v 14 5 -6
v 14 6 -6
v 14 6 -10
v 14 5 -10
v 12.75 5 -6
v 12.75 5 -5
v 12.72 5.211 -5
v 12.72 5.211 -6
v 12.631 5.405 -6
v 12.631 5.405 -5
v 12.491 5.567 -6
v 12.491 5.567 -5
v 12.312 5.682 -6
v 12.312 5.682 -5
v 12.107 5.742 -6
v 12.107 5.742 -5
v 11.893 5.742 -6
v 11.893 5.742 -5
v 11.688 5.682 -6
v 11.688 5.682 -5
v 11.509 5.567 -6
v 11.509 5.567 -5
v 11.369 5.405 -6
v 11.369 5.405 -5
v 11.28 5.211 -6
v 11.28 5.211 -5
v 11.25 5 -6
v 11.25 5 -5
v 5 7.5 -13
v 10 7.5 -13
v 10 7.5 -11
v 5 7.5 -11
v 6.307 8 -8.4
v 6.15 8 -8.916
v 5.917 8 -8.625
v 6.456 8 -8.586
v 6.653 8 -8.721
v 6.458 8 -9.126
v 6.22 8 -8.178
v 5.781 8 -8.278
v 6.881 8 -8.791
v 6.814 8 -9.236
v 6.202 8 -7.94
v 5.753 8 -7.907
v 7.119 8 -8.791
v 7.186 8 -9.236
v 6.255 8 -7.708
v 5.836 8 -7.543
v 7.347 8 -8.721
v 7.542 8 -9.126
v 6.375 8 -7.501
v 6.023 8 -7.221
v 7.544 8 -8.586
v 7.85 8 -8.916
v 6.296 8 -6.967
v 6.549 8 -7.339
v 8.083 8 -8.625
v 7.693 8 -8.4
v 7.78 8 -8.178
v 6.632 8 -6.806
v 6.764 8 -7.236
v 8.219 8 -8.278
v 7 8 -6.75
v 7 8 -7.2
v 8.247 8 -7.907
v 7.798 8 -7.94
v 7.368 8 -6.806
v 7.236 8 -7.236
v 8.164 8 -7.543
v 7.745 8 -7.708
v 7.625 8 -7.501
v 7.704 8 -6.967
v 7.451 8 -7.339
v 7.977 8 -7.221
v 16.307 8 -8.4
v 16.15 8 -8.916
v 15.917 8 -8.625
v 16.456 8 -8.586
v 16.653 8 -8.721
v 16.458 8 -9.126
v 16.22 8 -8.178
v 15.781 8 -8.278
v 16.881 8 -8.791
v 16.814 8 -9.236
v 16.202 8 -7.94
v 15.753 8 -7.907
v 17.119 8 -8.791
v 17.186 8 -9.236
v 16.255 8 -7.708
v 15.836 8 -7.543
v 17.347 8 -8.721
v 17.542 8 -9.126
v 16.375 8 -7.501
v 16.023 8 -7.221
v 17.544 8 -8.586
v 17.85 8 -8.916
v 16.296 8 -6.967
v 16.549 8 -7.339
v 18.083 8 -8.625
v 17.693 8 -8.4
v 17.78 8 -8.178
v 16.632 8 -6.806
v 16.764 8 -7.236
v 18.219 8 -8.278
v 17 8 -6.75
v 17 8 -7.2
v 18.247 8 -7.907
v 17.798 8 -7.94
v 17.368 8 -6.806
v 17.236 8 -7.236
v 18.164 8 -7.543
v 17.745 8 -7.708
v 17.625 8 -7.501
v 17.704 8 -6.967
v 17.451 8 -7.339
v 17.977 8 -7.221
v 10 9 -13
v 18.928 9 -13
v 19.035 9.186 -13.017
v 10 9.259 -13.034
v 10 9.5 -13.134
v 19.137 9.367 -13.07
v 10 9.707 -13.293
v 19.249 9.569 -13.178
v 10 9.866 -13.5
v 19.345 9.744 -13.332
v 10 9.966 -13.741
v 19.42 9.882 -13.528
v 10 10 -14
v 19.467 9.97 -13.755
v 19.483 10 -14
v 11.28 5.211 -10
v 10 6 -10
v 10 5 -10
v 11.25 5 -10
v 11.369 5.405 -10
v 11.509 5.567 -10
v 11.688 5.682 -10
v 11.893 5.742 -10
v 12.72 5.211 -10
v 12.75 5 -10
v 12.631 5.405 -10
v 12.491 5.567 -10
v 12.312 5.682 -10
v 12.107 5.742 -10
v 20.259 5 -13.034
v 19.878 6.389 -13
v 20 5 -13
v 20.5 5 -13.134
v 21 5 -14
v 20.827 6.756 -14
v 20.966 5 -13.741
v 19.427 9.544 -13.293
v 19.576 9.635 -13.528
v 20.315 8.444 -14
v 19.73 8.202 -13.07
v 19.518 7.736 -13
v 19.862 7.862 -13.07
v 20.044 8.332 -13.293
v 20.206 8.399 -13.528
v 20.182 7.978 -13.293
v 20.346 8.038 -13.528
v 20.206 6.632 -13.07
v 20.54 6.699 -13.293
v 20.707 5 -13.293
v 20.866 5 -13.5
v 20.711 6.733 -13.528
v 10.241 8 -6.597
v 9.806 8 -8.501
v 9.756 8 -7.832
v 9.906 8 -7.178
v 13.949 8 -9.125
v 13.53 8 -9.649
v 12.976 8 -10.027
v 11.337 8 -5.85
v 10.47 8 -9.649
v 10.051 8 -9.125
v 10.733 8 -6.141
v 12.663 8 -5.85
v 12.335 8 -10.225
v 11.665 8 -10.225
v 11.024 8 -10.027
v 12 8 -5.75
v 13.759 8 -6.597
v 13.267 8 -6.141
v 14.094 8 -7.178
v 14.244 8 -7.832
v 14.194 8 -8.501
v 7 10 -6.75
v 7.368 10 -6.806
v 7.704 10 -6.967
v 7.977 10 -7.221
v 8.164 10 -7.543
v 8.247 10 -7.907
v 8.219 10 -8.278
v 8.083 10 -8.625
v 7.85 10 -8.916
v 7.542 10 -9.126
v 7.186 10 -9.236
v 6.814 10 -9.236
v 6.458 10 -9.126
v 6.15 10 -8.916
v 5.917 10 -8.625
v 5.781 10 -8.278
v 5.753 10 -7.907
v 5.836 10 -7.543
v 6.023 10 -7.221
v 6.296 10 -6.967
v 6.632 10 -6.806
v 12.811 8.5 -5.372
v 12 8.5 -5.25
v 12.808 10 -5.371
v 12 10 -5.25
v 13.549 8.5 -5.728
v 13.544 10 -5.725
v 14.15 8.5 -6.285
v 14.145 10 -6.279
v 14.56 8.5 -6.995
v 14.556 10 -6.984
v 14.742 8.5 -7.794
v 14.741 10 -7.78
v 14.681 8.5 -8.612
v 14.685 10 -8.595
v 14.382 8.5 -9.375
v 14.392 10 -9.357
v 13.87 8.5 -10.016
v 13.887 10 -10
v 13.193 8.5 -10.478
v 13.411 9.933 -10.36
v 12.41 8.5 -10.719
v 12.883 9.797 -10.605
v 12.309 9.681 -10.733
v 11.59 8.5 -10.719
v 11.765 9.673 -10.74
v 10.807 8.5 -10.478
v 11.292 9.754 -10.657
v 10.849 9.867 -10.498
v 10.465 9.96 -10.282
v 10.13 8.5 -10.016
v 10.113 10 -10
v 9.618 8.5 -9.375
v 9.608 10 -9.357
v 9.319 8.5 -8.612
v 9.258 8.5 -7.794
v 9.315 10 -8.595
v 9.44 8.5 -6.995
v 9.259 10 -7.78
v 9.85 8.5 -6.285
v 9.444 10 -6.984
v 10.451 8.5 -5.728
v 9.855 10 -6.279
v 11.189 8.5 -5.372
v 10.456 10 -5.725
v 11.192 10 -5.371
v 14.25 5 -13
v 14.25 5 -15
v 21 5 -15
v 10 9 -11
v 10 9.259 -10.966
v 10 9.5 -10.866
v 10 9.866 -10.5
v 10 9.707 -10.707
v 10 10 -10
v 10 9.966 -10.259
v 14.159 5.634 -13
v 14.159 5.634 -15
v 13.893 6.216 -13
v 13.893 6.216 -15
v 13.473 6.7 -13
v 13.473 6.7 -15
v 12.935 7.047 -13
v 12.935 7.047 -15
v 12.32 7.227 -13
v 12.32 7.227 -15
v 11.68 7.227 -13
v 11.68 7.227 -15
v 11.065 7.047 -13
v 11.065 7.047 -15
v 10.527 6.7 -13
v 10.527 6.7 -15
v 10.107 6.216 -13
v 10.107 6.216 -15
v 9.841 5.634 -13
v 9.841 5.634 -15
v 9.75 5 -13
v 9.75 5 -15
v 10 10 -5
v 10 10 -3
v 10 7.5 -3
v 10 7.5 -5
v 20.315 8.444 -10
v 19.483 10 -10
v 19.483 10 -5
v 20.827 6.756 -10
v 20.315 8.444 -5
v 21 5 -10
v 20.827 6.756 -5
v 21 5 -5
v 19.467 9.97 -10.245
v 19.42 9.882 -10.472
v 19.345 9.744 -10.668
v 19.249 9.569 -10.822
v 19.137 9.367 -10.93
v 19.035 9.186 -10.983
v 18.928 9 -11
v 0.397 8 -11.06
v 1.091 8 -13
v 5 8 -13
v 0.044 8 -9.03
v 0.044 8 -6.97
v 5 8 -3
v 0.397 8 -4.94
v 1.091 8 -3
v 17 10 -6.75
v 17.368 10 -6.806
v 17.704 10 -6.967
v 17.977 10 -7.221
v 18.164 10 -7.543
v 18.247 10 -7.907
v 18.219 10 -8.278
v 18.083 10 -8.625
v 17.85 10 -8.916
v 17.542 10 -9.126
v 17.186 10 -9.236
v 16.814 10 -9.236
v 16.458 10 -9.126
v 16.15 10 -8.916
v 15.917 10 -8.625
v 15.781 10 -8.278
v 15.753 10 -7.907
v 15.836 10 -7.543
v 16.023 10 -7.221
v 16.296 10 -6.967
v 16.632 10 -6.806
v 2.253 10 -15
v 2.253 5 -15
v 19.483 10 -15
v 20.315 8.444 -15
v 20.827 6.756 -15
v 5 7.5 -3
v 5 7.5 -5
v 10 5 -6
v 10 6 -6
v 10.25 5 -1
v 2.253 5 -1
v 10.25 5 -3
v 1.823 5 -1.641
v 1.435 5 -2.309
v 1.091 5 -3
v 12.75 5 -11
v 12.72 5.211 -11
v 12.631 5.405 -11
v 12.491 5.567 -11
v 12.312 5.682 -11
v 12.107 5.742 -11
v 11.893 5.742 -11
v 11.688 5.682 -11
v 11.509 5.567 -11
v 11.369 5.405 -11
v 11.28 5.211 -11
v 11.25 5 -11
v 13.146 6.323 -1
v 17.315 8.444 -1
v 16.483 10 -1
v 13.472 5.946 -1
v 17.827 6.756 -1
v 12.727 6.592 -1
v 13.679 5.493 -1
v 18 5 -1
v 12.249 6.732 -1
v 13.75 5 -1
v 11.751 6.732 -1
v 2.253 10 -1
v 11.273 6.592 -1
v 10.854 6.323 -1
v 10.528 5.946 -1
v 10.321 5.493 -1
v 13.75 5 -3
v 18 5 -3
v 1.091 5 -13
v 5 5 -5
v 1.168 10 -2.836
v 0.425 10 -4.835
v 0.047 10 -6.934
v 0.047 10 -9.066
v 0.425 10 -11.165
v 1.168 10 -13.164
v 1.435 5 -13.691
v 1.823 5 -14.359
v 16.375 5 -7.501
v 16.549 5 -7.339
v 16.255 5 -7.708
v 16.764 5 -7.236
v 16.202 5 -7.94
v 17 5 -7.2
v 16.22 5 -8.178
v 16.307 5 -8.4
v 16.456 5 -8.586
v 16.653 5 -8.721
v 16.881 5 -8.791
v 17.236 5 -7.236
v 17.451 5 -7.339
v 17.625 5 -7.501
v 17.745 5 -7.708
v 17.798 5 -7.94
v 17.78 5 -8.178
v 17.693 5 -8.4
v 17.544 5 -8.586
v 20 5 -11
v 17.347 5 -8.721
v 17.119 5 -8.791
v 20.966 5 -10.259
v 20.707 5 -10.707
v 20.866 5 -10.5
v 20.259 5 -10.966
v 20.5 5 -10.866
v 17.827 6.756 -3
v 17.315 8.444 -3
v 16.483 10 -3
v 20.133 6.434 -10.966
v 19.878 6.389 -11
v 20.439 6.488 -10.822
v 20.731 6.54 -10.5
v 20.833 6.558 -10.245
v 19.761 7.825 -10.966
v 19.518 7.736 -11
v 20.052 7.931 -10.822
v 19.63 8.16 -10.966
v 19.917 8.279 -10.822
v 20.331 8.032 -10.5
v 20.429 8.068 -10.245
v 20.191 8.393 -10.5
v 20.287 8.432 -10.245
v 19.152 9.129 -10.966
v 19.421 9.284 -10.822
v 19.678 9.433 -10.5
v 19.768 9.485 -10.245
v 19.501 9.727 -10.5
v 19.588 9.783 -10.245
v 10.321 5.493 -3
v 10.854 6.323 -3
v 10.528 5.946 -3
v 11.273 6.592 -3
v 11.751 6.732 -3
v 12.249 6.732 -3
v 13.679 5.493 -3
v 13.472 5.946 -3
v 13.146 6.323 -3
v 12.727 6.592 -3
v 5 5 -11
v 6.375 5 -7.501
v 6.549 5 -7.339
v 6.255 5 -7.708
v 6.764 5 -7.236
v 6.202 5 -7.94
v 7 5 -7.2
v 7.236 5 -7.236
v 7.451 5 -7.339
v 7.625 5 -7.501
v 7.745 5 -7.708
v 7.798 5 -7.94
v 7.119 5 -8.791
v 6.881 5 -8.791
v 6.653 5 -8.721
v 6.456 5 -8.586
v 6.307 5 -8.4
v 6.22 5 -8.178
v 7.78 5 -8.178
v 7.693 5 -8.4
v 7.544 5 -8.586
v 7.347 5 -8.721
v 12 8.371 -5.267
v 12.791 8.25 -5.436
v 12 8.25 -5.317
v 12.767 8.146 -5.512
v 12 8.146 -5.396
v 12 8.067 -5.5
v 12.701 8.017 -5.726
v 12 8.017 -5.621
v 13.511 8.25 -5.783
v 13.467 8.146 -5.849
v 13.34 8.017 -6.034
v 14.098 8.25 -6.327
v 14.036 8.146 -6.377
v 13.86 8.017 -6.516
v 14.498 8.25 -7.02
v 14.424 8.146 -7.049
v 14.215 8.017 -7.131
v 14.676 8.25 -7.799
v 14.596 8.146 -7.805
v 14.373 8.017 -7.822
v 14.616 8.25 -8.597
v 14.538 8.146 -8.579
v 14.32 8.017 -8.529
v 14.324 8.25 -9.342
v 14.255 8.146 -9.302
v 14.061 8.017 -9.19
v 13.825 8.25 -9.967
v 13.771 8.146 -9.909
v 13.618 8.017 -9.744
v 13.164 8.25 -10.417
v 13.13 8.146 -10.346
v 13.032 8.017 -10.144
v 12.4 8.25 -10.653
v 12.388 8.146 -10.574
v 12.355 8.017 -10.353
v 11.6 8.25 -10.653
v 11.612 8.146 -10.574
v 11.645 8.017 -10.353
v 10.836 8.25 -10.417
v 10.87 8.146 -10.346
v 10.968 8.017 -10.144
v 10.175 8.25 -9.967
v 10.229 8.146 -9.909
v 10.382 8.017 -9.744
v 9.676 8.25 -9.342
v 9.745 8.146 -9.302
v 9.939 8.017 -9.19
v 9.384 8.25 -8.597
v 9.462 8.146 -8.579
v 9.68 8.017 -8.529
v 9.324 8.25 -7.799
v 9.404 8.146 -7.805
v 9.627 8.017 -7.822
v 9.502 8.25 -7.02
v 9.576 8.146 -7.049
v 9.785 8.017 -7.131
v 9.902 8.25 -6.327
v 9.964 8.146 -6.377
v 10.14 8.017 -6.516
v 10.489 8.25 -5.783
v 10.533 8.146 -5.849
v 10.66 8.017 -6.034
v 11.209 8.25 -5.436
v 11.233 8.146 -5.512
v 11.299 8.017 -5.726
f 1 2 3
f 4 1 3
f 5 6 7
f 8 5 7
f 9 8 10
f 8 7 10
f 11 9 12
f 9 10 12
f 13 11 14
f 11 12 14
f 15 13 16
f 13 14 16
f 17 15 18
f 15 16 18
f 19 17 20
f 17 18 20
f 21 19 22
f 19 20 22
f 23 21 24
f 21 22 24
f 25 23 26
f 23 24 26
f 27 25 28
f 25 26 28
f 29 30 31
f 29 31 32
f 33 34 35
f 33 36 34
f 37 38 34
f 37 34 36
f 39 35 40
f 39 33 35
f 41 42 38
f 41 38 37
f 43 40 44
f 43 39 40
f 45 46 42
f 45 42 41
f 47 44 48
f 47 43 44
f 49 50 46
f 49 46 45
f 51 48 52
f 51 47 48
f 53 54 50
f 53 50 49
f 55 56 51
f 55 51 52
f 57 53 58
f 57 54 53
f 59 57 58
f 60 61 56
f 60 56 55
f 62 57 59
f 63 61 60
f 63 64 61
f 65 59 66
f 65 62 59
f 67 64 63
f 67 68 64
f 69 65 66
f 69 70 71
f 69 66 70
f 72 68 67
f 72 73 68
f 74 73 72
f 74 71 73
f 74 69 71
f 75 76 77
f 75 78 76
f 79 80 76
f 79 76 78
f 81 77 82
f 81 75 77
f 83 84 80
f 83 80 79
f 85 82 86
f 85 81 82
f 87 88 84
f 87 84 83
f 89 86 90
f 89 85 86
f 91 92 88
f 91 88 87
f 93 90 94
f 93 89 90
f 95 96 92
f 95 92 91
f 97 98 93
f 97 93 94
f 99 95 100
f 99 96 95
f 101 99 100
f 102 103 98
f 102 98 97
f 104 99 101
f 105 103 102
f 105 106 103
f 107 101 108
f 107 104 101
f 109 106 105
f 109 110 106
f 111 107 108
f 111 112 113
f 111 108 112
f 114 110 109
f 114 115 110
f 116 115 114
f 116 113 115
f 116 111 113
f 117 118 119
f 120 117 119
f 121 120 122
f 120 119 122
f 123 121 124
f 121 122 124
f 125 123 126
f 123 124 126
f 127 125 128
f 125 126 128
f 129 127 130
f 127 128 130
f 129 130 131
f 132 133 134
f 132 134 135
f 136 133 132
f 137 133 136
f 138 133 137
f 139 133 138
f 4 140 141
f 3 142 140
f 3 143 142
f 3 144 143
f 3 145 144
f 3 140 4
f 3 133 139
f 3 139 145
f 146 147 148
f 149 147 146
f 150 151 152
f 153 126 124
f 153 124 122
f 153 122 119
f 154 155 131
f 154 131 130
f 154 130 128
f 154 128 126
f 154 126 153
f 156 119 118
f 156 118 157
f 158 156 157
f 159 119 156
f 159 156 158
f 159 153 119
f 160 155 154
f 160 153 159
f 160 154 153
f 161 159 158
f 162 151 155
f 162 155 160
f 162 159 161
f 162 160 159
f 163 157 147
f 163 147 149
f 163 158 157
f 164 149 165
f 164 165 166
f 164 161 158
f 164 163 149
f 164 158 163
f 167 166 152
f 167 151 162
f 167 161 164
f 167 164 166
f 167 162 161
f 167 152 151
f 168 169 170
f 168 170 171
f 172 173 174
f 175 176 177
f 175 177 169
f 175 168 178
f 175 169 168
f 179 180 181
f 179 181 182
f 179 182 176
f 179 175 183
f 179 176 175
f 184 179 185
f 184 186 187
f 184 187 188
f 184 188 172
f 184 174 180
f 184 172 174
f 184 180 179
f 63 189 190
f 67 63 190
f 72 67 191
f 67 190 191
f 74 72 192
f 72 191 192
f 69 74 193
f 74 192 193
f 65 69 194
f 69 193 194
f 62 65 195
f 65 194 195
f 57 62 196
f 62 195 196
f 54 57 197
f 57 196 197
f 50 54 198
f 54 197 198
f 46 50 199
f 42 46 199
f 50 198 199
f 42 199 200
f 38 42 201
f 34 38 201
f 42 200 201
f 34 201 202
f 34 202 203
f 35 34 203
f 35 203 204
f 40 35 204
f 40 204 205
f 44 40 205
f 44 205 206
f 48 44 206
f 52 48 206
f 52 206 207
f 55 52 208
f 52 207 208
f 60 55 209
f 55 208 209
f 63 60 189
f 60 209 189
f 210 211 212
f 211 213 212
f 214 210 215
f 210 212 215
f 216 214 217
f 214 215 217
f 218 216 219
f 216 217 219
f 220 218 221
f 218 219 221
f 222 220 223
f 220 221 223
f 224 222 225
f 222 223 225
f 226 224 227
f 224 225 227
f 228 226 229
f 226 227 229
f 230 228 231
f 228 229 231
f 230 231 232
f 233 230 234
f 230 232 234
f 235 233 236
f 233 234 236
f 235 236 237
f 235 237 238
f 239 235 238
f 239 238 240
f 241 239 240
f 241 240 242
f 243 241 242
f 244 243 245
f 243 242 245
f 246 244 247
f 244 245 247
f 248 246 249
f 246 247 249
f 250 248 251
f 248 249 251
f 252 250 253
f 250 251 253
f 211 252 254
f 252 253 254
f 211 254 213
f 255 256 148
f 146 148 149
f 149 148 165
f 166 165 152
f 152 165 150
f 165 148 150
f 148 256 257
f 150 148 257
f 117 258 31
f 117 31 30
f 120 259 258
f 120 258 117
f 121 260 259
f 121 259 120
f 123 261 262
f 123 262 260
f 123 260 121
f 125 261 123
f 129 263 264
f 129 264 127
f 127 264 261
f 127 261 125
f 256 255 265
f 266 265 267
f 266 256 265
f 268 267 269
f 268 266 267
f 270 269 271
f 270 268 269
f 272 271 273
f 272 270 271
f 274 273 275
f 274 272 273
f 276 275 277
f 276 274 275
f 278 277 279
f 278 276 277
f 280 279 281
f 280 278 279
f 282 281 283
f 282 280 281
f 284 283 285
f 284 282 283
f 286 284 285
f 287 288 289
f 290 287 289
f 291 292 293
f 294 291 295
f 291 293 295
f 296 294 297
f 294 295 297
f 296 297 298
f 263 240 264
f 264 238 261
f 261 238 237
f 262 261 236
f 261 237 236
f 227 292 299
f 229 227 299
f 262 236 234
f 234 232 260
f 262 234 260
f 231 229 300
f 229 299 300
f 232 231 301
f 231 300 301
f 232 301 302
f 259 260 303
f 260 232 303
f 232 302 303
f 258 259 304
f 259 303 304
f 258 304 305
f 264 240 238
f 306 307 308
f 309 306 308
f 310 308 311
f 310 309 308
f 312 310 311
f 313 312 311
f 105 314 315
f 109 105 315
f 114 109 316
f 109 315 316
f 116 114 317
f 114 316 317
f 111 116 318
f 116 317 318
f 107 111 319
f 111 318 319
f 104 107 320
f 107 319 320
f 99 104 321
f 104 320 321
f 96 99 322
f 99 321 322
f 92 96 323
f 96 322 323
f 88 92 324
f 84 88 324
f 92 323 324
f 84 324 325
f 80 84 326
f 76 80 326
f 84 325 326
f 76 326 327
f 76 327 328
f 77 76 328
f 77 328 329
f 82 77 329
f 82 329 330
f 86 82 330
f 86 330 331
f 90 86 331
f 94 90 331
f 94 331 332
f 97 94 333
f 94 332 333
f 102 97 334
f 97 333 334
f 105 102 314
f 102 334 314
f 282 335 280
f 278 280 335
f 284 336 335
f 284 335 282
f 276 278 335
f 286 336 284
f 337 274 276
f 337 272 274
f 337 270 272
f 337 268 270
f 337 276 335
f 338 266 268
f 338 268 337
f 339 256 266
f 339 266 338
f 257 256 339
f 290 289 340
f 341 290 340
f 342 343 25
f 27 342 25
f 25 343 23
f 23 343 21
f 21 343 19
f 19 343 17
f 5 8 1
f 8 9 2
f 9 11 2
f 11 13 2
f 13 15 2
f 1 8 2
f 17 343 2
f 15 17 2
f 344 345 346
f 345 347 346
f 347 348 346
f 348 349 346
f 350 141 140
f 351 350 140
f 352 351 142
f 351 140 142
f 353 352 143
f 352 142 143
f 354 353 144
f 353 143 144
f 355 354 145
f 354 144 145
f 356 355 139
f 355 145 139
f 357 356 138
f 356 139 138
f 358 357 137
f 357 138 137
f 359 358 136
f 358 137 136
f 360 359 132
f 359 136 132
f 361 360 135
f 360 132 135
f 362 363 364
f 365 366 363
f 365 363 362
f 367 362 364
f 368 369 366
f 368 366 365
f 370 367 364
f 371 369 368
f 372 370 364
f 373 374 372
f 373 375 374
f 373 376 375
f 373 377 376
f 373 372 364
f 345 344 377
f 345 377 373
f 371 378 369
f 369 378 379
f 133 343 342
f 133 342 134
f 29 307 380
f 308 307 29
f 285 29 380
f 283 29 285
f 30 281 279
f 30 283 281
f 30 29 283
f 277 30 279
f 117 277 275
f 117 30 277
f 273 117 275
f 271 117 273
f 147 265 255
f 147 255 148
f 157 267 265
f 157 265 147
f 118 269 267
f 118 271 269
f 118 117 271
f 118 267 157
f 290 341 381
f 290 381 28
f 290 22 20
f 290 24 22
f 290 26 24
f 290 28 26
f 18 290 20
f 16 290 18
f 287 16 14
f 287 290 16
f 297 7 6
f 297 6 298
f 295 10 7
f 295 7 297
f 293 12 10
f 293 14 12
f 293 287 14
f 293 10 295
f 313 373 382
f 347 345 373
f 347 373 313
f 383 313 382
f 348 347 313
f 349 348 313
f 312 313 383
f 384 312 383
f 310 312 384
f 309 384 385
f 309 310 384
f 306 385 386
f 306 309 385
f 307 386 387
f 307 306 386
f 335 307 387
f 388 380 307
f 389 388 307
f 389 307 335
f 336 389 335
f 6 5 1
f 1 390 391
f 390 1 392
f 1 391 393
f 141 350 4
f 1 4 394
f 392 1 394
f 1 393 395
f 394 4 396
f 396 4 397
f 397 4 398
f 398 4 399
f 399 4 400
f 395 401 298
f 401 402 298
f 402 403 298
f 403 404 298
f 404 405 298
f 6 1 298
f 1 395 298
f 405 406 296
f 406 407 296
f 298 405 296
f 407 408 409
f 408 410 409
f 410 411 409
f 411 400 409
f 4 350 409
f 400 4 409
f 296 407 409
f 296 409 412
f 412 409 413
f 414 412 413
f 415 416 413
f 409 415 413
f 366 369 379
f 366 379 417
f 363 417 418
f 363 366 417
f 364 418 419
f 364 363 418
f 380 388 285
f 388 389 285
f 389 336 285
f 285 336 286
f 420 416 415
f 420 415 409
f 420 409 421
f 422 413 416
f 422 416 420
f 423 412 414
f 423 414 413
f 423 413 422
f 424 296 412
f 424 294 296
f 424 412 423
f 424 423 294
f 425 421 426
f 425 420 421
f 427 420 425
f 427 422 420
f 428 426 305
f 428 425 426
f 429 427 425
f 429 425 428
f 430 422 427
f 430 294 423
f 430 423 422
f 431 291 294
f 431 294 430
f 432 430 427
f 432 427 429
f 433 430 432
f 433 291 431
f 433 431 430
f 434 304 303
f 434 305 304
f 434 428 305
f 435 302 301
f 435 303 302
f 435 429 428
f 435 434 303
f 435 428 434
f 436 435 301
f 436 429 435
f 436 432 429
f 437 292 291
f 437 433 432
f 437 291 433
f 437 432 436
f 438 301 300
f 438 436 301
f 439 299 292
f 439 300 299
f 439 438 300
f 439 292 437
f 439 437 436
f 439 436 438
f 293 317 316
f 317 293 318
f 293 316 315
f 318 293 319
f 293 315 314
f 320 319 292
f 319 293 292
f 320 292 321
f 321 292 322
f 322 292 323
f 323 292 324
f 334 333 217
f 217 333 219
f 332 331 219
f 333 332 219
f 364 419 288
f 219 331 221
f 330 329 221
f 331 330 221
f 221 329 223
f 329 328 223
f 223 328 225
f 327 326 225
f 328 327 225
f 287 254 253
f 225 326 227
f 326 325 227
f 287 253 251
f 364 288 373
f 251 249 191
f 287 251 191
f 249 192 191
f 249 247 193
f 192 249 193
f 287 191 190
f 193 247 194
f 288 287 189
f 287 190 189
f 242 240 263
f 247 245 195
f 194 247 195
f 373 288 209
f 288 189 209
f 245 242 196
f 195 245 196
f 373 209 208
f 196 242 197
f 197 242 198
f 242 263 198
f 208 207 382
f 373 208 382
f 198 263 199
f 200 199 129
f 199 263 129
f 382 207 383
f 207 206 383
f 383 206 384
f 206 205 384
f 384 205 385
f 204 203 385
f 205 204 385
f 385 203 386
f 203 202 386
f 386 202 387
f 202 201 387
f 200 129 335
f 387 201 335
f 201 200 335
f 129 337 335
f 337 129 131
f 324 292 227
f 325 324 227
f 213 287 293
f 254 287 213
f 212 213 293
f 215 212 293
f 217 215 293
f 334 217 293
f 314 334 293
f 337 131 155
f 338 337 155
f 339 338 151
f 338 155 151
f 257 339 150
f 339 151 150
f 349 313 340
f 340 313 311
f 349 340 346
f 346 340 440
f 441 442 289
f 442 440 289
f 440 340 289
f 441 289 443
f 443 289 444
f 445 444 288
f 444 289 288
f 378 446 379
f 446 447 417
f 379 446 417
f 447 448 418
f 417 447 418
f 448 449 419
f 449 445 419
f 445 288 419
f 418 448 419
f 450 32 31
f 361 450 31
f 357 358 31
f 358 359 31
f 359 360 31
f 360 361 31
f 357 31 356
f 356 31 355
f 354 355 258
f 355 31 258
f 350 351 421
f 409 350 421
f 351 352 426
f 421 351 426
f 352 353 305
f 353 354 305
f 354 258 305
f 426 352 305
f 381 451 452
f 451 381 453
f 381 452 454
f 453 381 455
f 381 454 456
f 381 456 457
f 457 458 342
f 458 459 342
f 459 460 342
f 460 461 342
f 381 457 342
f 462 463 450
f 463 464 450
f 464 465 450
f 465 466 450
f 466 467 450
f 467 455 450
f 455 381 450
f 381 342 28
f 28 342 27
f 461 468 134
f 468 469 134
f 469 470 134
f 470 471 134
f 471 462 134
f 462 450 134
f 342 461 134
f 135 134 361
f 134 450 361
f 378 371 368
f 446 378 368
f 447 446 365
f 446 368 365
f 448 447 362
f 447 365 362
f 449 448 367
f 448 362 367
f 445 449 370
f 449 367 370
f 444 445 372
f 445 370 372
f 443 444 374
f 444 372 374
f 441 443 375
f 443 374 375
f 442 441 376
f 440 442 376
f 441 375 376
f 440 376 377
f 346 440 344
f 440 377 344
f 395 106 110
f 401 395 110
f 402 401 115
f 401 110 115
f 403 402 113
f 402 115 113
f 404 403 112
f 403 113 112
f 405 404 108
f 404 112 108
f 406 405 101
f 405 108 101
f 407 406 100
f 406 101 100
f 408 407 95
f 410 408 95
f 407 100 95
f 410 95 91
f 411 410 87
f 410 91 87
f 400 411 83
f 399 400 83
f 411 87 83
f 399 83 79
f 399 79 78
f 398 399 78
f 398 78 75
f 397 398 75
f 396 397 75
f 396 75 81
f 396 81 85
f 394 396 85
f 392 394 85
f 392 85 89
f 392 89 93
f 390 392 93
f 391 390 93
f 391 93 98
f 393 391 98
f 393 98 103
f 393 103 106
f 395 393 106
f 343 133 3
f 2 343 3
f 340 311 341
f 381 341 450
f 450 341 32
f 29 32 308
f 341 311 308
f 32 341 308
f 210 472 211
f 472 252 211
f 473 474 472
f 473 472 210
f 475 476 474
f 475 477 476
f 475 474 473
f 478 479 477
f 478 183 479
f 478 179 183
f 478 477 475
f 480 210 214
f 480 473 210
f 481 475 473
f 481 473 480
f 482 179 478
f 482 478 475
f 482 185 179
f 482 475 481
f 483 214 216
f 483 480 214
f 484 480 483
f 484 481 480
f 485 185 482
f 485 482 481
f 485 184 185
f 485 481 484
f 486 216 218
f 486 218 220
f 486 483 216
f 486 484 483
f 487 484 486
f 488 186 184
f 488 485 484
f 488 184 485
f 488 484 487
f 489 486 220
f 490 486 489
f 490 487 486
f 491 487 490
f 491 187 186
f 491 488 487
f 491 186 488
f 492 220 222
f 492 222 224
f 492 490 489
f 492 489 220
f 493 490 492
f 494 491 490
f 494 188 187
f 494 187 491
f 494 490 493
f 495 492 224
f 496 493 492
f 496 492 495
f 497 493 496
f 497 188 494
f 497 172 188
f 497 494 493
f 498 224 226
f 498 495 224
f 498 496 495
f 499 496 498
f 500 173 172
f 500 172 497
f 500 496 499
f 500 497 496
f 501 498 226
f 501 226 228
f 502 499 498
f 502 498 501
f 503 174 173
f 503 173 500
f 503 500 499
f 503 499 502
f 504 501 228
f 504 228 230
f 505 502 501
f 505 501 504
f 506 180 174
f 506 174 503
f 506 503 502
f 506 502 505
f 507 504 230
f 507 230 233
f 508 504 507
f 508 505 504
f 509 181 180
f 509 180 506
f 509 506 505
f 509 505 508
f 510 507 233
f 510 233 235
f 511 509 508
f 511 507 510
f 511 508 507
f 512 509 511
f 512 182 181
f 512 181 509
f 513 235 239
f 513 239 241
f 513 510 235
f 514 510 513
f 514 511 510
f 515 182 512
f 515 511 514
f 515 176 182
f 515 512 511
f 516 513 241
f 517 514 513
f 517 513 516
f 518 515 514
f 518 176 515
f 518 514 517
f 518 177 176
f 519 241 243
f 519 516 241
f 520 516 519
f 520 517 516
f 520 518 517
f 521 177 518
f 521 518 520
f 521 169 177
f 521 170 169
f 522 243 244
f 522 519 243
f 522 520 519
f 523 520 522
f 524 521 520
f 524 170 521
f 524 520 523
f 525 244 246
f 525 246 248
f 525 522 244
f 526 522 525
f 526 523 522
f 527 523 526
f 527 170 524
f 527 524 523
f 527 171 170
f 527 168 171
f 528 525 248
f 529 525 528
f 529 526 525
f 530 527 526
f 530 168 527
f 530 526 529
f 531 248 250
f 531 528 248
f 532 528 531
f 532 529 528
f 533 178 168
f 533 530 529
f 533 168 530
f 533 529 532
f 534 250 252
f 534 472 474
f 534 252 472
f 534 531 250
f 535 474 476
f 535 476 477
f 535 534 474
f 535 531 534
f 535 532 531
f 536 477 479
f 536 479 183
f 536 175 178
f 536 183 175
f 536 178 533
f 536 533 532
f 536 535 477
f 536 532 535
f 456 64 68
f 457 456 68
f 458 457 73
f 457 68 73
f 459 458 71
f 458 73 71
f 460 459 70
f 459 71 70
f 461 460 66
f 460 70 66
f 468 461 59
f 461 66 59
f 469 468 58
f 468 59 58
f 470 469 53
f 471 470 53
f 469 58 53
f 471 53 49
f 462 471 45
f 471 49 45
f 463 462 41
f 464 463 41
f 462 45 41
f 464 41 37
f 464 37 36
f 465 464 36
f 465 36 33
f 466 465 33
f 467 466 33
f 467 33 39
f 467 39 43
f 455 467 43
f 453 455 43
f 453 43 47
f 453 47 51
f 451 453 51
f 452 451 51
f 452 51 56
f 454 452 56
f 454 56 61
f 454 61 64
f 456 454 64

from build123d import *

# Parameters (mm, degrees)
BOSS_EXTRUDE1_DEPTH = 10
CUT_EXTRUDE3_DEPTH  = 28.676705006
CUT_EXTRUDE6_START  = -13
CUT_EXTRUDE6_DEPTH  = 2
CUT_EXTRUDE14_START = -3
CUT_EXTRUDE14_DEPTH = 2
CUT_EXTRUDE7_START  = 10
SKETCH8_R           = 2.75
CUT_EXTRUDE7_DEPTH  = 2
CUT_EXTRUDE8_START  = -16
SKETCH10_R          = 2.25
CUT_EXTRUDE8_DEPTH  = 3
CUT_EXTRUDE9_DEPTH  = 5
SKETCH18_R          = 0.75
CUT_EXTRUDE12_DEPTH = 28.676705006
CUT_EXTRUDE13_START = 5
SKETCH19_W          = 4
SKETCH19_H          = 4
CUT_EXTRUDE13_DEPTH = 1
CUT_EXTRUDE15_START = -1
SKETCH5_R           = 1.75
CUT_EXTRUDE15_DEPTH = 2
CUT_EXTRUDE16_START = -1
CUT_EXTRUDE16_DEPTH = 2
FILLET2_R           = 0.5
FILLET3_R           = 1
POT_INSERT_DEPTH    = 2.5
POT_START           = 4
SKETCH6_R           = 2.75
POT_HOLE_DEPTH      = 1.5
SCREW_START         = 11
SKETCH14_R          = 0.8
SCREW_HOLES_DEPTH   = 9
SCREW_START_2       = 10
SKETCH15_R          = 1.25
SCREW_HEADS_DEPTH   = 2
SKETCH13_W          = 21
SKETCH13_H          = 15
CUT_EXTRUDE11_DEPTH = 5


with BuildPart() as part:
    # Sketch1 → Boss-Extrude1 (new body)
    with BuildSketch(Plane(origin=(0, 0, 0), x_dir=(1, 0, 0), z_dir=(0, 1, 0))):
        with BuildLine():
            Line((21, 15), (21, 8))
            Line((21, 8), (21, 1))
            Line((21, 1), (12, 1))
            Line((12, 1), (2.253205655, 1))
            ThreePointArc((2.253205655, 1), (0, 8), (2.253205655, 15))
            Line((2.253205655, 15), (12, 15))
            Line((12, 15), (21, 15))
        make_face()
    extrude(amount=BOSS_EXTRUDE1_DEPTH)

    # Sketch4 → Cut-Extrude3 (cut, through all)
    with BuildSketch(Plane.XY):
        with BuildLine():
            Line((21, 14), (12, 14))
            ThreePointArc((12, 14), (18.363961031, 11.363961031), (21, 5))
            Line((21, 5), (21, 14))
        make_face()
        with BuildLine():
            Line((21, -4), (21, 5))
            ThreePointArc((21, 5), (18.363961031, -1.363961031), (12, -4))
            Line((12, -4), (21, -4))
        make_face()
    extrude(amount=-CUT_EXTRUDE3_DEPTH, mode=Mode.SUBTRACT)

    # Sketch7 → Cut-Extrude6 (cut)
    with BuildSketch(Plane.XY.offset(CUT_EXTRUDE6_START)):
        Polygon((21, 5.5), (21, 11), (10, 11), (10, 7.5), (0, 7.5), (0, 3.5), (21, 3.5), align=None)
    extrude(amount=CUT_EXTRUDE6_DEPTH, mode=Mode.SUBTRACT)

    # Sketch21 → Cut-Extrude14 (cut)
    with BuildSketch(Plane.XY.offset(CUT_EXTRUDE14_START)):
        Polygon((21, 5.5), (21, 11), (10, 11), (10, 7.5), (0, 7.5), (0, 3.5), (21, 3.5), align=None)
    extrude(amount=-CUT_EXTRUDE14_DEPTH, mode=Mode.SUBTRACT)

    # Sketch8 → Cut-Extrude7 (cut)
    with BuildSketch(Plane(origin=(0, 0, 0), x_dir=(1, 0, 0), z_dir=(0, 1, 0)).offset(CUT_EXTRUDE7_START)):
        with Locations(Location((12, 8, 0), (0, 0, 270))):
            Circle(SKETCH8_R)
    extrude(amount=-CUT_EXTRUDE7_DEPTH, mode=Mode.SUBTRACT)

    # Sketch10 → Cut-Extrude8 (cut)
    with BuildSketch(Plane.XY.offset(CUT_EXTRUDE8_START)):
        with Locations(Location((12, 5, 0), (0, 0, 221.810314896))):
            Circle(SKETCH10_R)
    extrude(amount=CUT_EXTRUDE8_DEPTH, mode=Mode.SUBTRACT)

    # Sketch11 → Cut-Extrude9 (cut)
    with BuildSketch(Plane(origin=(0, 0, 0), x_dir=(0, 0, -1), z_dir=(1, 0, 0))):
        Polygon((8, 2), (13, 2), (13, 8), (3, 8), (3, 2), align=None)
    extrude(amount=CUT_EXTRUDE9_DEPTH, mode=Mode.SUBTRACT)

    # Sketch18 → Cut-Extrude12 (cut, through all)
    with BuildSketch(Plane.XY):
        with Locations((12, 5)):
            Circle(SKETCH18_R)
    extrude(amount=-CUT_EXTRUDE12_DEPTH, mode=Mode.SUBTRACT)

    # Sketch19 → Cut-Extrude13 (cut, symmetric)
    with BuildSketch(Plane(origin=(0, 0, 0), x_dir=(1, 0, 0), z_dir=(0, 1, 0)).offset(CUT_EXTRUDE13_START)):
        with Locations((12, 8)):
            Rectangle(SKETCH19_W, SKETCH19_H)
    extrude(amount=CUT_EXTRUDE13_DEPTH, both=True, mode=Mode.SUBTRACT)

    # Sketch5 → Cut-Extrude15 (cut)
    with BuildSketch(Plane.XY.offset(CUT_EXTRUDE15_START)):
        with Locations((12, 5)):
            Circle(SKETCH5_R)
    extrude(amount=-CUT_EXTRUDE15_DEPTH, mode=Mode.SUBTRACT)

    # Sketch26 → Cut-Extrude16 (cut)
    with BuildSketch(Plane.XY.offset(CUT_EXTRUDE16_START)):
        with BuildLine():
            Line((16.483314774, 10), (19.483314774, 10))
            ThreePointArc((19.483314774, 10), (20.800790614, 6.883105034), (20.874119675, 3.5))
            Line((20.874119675, 3.5), (17.874119675, 3.5))
            ThreePointArc((17.874119675, 3.5), (17.800790614, 6.883105034), (16.483314774, 10))
        make_face()
    extrude(amount=-CUT_EXTRUDE16_DEPTH, mode=Mode.SUBTRACT)

    # Fillet2
    fillet2_edges = [part.edges().sort_by_distance(p)[0] for p in [
        (12, 8, -10.75),
    ]]
    fillet(fillet2_edges, radius=FILLET2_R)

    # Fillet3
    # the kernel refuses this fillet: 1 mm, written as the material it takes off along each edge
    with BuildSketch(Plane(origin=(12, 5, -13), x_dir=(0.6472427025312245, 0.7622839917118008, 0), z_dir=(-0.7622839917118008, 0.6472427025312245, 0))) as fillet3_piece_1_section:
        with BuildLine():
            CenterArc((9 - FILLET3_R, FILLET3_R), FILLET3_R, 270, 90)
            Line((9 - FILLET3_R, 0), (9, 0))
            Line((9, 0), (9, FILLET3_R))
        make_face()
    fillet3_piece_1 = revolve(axis=Axis((12, 5, -13), (0, 0, -1)), revolution_arc=75.177010416, mode=Mode.PRIVATE)
    fillet3_piece_1 = split(fillet3_piece_1, bisect_by=Plane(origin=(20.22008164, 3.5, -13.28352735), z_dir=(0, 1, 0)), keep=Keep.TOP, mode=Mode.PRIVATE)
    add(fillet3_piece_1, mode=Mode.SUBTRACT)
    with BuildSketch(Plane(origin=(12, 5, -11), x_dir=(0.9025022770828605, -0.43068508200337235, 0), z_dir=(-0.43068508200337235, -0.9025022770828605, 0))) as fillet3_piece_2_section:
        with BuildLine():
            CenterArc((9 - FILLET3_R, FILLET3_R), FILLET3_R, 270, 90)
            Line((9 - FILLET3_R, 0), (9, 0))
            Line((9, 0), (9, FILLET3_R))
        make_face()
    fillet3_piece_2 = revolve(axis=Axis((12, 5, -11), (0, 0, 1)), revolution_arc=75.177010416, mode=Mode.PRIVATE)
    fillet3_piece_2 = split(fillet3_piece_2, bisect_by=Plane(origin=(20.220081643, 3.5, -10.716472653), z_dir=(0, 1, 0)), keep=Keep.TOP, mode=Mode.PRIVATE)
    add(fillet3_piece_2, mode=Mode.SUBTRACT)
    with BuildSketch(Plane(origin=(21.983314774, 10, -11), x_dir=(0, 0, 1), z_dir=(-1, 0, 0))) as fillet3_piece_3:
        with BuildLine():
            CenterArc((FILLET3_R, -FILLET3_R), FILLET3_R, 90, 90)
            Line((0, -FILLET3_R), (0, 0))
            Line((0, 0), (FILLET3_R, 0))
        make_face()
    extrude(amount=11.983314774, mode=Mode.SUBTRACT)
    with BuildSketch(Plane(origin=(21.983314774, 10, -13), x_dir=(0, 0, -1), z_dir=(-1, 0, 0))) as fillet3_piece_4:
        with BuildLine():
            CenterArc((FILLET3_R, FILLET3_R), FILLET3_R, 180, 90)
            Line((0, FILLET3_R), (0, 0))
            Line((0, 0), (FILLET3_R, 0))
        make_face()
    extrude(amount=11.983314774, mode=Mode.SUBTRACT)

    # Sketch3 → Pot Insert (cut)
    with BuildSketch(Plane(origin=(28.28760271, 0, 0), x_dir=(1, 0, 0), z_dir=(0, 1, 0))):
        Polygon((-25.28760271, 12.5), (-20.53760271, 12.5), (-20.53760271, 13.5), (-16.28760271, 13.5), (-12.291072924, 13.5), (-12.291072924, 12.500096395), (-10.791072924, 9.500096395), (-9.28760271, 9.500096395), (-9.28760271, 8), (-9.28760271, 6.5), (-10.78760271, 6.5), (-12.28760271, 3.5), (-12.28760271, 2.5), (-16.28760271, 2.5), (-20.53760271, 2.5), (-20.53760271, 3.5), (-25.28760271, 3.5), (-25.28760271, 8), align=None)
    extrude(amount=POT_INSERT_DEPTH, mode=Mode.SUBTRACT)

    # Sketch6 → Pot Hole (cut)
    with BuildSketch(Plane(origin=(0, 0, 0), x_dir=(1, 0, 0), z_dir=(0, 1, 0)).offset(POT_START)):
        with Locations(Location((12, 8, 0), (0, 0, 270))):
            Circle(SKETCH6_R)
    extrude(amount=-POT_HOLE_DEPTH, mode=Mode.SUBTRACT)

    # Sketch14 → Screw Holes (cut)
    with BuildSketch(Plane(origin=(0, 0, 0), x_dir=(1, 0, 0), z_dir=(0, 1, 0)).offset(SCREW_START)):
        with Locations(Location((7, 8, 0), (0, 0, 270))):
            Circle(SKETCH14_R)
        with Locations(Location((17, 8, 0), (0, 0, 270))):
            Circle(SKETCH14_R)
    extrude(amount=-SCREW_HOLES_DEPTH, mode=Mode.SUBTRACT)

    # Sketch15 → Screw Heads (cut)
    with BuildSketch(Plane(origin=(0, 0, 0), x_dir=(1, 0, 0), z_dir=(0, 1, 0)).offset(SCREW_START_2)):
        with Locations(Location((7, 8, 0), (0, 0, 270))):
            Circle(SKETCH15_R)
        with Locations(Location((17, 8, 0), (0, 0, 270))):
            Circle(SKETCH15_R)
    extrude(amount=-SCREW_HEADS_DEPTH, mode=Mode.SUBTRACT)

    # Sketch13 → Cut-Extrude11 (cut)
    with BuildSketch(Plane(origin=(0, 0, 0), x_dir=(1, 0, 0), z_dir=(0, 1, 0))):
        with Locations((10.5, 7.5)):
            Rectangle(SKETCH13_W, SKETCH13_H)
    extrude(amount=CUT_EXTRUDE11_DEPTH, mode=Mode.SUBTRACT)


solid = part.part
